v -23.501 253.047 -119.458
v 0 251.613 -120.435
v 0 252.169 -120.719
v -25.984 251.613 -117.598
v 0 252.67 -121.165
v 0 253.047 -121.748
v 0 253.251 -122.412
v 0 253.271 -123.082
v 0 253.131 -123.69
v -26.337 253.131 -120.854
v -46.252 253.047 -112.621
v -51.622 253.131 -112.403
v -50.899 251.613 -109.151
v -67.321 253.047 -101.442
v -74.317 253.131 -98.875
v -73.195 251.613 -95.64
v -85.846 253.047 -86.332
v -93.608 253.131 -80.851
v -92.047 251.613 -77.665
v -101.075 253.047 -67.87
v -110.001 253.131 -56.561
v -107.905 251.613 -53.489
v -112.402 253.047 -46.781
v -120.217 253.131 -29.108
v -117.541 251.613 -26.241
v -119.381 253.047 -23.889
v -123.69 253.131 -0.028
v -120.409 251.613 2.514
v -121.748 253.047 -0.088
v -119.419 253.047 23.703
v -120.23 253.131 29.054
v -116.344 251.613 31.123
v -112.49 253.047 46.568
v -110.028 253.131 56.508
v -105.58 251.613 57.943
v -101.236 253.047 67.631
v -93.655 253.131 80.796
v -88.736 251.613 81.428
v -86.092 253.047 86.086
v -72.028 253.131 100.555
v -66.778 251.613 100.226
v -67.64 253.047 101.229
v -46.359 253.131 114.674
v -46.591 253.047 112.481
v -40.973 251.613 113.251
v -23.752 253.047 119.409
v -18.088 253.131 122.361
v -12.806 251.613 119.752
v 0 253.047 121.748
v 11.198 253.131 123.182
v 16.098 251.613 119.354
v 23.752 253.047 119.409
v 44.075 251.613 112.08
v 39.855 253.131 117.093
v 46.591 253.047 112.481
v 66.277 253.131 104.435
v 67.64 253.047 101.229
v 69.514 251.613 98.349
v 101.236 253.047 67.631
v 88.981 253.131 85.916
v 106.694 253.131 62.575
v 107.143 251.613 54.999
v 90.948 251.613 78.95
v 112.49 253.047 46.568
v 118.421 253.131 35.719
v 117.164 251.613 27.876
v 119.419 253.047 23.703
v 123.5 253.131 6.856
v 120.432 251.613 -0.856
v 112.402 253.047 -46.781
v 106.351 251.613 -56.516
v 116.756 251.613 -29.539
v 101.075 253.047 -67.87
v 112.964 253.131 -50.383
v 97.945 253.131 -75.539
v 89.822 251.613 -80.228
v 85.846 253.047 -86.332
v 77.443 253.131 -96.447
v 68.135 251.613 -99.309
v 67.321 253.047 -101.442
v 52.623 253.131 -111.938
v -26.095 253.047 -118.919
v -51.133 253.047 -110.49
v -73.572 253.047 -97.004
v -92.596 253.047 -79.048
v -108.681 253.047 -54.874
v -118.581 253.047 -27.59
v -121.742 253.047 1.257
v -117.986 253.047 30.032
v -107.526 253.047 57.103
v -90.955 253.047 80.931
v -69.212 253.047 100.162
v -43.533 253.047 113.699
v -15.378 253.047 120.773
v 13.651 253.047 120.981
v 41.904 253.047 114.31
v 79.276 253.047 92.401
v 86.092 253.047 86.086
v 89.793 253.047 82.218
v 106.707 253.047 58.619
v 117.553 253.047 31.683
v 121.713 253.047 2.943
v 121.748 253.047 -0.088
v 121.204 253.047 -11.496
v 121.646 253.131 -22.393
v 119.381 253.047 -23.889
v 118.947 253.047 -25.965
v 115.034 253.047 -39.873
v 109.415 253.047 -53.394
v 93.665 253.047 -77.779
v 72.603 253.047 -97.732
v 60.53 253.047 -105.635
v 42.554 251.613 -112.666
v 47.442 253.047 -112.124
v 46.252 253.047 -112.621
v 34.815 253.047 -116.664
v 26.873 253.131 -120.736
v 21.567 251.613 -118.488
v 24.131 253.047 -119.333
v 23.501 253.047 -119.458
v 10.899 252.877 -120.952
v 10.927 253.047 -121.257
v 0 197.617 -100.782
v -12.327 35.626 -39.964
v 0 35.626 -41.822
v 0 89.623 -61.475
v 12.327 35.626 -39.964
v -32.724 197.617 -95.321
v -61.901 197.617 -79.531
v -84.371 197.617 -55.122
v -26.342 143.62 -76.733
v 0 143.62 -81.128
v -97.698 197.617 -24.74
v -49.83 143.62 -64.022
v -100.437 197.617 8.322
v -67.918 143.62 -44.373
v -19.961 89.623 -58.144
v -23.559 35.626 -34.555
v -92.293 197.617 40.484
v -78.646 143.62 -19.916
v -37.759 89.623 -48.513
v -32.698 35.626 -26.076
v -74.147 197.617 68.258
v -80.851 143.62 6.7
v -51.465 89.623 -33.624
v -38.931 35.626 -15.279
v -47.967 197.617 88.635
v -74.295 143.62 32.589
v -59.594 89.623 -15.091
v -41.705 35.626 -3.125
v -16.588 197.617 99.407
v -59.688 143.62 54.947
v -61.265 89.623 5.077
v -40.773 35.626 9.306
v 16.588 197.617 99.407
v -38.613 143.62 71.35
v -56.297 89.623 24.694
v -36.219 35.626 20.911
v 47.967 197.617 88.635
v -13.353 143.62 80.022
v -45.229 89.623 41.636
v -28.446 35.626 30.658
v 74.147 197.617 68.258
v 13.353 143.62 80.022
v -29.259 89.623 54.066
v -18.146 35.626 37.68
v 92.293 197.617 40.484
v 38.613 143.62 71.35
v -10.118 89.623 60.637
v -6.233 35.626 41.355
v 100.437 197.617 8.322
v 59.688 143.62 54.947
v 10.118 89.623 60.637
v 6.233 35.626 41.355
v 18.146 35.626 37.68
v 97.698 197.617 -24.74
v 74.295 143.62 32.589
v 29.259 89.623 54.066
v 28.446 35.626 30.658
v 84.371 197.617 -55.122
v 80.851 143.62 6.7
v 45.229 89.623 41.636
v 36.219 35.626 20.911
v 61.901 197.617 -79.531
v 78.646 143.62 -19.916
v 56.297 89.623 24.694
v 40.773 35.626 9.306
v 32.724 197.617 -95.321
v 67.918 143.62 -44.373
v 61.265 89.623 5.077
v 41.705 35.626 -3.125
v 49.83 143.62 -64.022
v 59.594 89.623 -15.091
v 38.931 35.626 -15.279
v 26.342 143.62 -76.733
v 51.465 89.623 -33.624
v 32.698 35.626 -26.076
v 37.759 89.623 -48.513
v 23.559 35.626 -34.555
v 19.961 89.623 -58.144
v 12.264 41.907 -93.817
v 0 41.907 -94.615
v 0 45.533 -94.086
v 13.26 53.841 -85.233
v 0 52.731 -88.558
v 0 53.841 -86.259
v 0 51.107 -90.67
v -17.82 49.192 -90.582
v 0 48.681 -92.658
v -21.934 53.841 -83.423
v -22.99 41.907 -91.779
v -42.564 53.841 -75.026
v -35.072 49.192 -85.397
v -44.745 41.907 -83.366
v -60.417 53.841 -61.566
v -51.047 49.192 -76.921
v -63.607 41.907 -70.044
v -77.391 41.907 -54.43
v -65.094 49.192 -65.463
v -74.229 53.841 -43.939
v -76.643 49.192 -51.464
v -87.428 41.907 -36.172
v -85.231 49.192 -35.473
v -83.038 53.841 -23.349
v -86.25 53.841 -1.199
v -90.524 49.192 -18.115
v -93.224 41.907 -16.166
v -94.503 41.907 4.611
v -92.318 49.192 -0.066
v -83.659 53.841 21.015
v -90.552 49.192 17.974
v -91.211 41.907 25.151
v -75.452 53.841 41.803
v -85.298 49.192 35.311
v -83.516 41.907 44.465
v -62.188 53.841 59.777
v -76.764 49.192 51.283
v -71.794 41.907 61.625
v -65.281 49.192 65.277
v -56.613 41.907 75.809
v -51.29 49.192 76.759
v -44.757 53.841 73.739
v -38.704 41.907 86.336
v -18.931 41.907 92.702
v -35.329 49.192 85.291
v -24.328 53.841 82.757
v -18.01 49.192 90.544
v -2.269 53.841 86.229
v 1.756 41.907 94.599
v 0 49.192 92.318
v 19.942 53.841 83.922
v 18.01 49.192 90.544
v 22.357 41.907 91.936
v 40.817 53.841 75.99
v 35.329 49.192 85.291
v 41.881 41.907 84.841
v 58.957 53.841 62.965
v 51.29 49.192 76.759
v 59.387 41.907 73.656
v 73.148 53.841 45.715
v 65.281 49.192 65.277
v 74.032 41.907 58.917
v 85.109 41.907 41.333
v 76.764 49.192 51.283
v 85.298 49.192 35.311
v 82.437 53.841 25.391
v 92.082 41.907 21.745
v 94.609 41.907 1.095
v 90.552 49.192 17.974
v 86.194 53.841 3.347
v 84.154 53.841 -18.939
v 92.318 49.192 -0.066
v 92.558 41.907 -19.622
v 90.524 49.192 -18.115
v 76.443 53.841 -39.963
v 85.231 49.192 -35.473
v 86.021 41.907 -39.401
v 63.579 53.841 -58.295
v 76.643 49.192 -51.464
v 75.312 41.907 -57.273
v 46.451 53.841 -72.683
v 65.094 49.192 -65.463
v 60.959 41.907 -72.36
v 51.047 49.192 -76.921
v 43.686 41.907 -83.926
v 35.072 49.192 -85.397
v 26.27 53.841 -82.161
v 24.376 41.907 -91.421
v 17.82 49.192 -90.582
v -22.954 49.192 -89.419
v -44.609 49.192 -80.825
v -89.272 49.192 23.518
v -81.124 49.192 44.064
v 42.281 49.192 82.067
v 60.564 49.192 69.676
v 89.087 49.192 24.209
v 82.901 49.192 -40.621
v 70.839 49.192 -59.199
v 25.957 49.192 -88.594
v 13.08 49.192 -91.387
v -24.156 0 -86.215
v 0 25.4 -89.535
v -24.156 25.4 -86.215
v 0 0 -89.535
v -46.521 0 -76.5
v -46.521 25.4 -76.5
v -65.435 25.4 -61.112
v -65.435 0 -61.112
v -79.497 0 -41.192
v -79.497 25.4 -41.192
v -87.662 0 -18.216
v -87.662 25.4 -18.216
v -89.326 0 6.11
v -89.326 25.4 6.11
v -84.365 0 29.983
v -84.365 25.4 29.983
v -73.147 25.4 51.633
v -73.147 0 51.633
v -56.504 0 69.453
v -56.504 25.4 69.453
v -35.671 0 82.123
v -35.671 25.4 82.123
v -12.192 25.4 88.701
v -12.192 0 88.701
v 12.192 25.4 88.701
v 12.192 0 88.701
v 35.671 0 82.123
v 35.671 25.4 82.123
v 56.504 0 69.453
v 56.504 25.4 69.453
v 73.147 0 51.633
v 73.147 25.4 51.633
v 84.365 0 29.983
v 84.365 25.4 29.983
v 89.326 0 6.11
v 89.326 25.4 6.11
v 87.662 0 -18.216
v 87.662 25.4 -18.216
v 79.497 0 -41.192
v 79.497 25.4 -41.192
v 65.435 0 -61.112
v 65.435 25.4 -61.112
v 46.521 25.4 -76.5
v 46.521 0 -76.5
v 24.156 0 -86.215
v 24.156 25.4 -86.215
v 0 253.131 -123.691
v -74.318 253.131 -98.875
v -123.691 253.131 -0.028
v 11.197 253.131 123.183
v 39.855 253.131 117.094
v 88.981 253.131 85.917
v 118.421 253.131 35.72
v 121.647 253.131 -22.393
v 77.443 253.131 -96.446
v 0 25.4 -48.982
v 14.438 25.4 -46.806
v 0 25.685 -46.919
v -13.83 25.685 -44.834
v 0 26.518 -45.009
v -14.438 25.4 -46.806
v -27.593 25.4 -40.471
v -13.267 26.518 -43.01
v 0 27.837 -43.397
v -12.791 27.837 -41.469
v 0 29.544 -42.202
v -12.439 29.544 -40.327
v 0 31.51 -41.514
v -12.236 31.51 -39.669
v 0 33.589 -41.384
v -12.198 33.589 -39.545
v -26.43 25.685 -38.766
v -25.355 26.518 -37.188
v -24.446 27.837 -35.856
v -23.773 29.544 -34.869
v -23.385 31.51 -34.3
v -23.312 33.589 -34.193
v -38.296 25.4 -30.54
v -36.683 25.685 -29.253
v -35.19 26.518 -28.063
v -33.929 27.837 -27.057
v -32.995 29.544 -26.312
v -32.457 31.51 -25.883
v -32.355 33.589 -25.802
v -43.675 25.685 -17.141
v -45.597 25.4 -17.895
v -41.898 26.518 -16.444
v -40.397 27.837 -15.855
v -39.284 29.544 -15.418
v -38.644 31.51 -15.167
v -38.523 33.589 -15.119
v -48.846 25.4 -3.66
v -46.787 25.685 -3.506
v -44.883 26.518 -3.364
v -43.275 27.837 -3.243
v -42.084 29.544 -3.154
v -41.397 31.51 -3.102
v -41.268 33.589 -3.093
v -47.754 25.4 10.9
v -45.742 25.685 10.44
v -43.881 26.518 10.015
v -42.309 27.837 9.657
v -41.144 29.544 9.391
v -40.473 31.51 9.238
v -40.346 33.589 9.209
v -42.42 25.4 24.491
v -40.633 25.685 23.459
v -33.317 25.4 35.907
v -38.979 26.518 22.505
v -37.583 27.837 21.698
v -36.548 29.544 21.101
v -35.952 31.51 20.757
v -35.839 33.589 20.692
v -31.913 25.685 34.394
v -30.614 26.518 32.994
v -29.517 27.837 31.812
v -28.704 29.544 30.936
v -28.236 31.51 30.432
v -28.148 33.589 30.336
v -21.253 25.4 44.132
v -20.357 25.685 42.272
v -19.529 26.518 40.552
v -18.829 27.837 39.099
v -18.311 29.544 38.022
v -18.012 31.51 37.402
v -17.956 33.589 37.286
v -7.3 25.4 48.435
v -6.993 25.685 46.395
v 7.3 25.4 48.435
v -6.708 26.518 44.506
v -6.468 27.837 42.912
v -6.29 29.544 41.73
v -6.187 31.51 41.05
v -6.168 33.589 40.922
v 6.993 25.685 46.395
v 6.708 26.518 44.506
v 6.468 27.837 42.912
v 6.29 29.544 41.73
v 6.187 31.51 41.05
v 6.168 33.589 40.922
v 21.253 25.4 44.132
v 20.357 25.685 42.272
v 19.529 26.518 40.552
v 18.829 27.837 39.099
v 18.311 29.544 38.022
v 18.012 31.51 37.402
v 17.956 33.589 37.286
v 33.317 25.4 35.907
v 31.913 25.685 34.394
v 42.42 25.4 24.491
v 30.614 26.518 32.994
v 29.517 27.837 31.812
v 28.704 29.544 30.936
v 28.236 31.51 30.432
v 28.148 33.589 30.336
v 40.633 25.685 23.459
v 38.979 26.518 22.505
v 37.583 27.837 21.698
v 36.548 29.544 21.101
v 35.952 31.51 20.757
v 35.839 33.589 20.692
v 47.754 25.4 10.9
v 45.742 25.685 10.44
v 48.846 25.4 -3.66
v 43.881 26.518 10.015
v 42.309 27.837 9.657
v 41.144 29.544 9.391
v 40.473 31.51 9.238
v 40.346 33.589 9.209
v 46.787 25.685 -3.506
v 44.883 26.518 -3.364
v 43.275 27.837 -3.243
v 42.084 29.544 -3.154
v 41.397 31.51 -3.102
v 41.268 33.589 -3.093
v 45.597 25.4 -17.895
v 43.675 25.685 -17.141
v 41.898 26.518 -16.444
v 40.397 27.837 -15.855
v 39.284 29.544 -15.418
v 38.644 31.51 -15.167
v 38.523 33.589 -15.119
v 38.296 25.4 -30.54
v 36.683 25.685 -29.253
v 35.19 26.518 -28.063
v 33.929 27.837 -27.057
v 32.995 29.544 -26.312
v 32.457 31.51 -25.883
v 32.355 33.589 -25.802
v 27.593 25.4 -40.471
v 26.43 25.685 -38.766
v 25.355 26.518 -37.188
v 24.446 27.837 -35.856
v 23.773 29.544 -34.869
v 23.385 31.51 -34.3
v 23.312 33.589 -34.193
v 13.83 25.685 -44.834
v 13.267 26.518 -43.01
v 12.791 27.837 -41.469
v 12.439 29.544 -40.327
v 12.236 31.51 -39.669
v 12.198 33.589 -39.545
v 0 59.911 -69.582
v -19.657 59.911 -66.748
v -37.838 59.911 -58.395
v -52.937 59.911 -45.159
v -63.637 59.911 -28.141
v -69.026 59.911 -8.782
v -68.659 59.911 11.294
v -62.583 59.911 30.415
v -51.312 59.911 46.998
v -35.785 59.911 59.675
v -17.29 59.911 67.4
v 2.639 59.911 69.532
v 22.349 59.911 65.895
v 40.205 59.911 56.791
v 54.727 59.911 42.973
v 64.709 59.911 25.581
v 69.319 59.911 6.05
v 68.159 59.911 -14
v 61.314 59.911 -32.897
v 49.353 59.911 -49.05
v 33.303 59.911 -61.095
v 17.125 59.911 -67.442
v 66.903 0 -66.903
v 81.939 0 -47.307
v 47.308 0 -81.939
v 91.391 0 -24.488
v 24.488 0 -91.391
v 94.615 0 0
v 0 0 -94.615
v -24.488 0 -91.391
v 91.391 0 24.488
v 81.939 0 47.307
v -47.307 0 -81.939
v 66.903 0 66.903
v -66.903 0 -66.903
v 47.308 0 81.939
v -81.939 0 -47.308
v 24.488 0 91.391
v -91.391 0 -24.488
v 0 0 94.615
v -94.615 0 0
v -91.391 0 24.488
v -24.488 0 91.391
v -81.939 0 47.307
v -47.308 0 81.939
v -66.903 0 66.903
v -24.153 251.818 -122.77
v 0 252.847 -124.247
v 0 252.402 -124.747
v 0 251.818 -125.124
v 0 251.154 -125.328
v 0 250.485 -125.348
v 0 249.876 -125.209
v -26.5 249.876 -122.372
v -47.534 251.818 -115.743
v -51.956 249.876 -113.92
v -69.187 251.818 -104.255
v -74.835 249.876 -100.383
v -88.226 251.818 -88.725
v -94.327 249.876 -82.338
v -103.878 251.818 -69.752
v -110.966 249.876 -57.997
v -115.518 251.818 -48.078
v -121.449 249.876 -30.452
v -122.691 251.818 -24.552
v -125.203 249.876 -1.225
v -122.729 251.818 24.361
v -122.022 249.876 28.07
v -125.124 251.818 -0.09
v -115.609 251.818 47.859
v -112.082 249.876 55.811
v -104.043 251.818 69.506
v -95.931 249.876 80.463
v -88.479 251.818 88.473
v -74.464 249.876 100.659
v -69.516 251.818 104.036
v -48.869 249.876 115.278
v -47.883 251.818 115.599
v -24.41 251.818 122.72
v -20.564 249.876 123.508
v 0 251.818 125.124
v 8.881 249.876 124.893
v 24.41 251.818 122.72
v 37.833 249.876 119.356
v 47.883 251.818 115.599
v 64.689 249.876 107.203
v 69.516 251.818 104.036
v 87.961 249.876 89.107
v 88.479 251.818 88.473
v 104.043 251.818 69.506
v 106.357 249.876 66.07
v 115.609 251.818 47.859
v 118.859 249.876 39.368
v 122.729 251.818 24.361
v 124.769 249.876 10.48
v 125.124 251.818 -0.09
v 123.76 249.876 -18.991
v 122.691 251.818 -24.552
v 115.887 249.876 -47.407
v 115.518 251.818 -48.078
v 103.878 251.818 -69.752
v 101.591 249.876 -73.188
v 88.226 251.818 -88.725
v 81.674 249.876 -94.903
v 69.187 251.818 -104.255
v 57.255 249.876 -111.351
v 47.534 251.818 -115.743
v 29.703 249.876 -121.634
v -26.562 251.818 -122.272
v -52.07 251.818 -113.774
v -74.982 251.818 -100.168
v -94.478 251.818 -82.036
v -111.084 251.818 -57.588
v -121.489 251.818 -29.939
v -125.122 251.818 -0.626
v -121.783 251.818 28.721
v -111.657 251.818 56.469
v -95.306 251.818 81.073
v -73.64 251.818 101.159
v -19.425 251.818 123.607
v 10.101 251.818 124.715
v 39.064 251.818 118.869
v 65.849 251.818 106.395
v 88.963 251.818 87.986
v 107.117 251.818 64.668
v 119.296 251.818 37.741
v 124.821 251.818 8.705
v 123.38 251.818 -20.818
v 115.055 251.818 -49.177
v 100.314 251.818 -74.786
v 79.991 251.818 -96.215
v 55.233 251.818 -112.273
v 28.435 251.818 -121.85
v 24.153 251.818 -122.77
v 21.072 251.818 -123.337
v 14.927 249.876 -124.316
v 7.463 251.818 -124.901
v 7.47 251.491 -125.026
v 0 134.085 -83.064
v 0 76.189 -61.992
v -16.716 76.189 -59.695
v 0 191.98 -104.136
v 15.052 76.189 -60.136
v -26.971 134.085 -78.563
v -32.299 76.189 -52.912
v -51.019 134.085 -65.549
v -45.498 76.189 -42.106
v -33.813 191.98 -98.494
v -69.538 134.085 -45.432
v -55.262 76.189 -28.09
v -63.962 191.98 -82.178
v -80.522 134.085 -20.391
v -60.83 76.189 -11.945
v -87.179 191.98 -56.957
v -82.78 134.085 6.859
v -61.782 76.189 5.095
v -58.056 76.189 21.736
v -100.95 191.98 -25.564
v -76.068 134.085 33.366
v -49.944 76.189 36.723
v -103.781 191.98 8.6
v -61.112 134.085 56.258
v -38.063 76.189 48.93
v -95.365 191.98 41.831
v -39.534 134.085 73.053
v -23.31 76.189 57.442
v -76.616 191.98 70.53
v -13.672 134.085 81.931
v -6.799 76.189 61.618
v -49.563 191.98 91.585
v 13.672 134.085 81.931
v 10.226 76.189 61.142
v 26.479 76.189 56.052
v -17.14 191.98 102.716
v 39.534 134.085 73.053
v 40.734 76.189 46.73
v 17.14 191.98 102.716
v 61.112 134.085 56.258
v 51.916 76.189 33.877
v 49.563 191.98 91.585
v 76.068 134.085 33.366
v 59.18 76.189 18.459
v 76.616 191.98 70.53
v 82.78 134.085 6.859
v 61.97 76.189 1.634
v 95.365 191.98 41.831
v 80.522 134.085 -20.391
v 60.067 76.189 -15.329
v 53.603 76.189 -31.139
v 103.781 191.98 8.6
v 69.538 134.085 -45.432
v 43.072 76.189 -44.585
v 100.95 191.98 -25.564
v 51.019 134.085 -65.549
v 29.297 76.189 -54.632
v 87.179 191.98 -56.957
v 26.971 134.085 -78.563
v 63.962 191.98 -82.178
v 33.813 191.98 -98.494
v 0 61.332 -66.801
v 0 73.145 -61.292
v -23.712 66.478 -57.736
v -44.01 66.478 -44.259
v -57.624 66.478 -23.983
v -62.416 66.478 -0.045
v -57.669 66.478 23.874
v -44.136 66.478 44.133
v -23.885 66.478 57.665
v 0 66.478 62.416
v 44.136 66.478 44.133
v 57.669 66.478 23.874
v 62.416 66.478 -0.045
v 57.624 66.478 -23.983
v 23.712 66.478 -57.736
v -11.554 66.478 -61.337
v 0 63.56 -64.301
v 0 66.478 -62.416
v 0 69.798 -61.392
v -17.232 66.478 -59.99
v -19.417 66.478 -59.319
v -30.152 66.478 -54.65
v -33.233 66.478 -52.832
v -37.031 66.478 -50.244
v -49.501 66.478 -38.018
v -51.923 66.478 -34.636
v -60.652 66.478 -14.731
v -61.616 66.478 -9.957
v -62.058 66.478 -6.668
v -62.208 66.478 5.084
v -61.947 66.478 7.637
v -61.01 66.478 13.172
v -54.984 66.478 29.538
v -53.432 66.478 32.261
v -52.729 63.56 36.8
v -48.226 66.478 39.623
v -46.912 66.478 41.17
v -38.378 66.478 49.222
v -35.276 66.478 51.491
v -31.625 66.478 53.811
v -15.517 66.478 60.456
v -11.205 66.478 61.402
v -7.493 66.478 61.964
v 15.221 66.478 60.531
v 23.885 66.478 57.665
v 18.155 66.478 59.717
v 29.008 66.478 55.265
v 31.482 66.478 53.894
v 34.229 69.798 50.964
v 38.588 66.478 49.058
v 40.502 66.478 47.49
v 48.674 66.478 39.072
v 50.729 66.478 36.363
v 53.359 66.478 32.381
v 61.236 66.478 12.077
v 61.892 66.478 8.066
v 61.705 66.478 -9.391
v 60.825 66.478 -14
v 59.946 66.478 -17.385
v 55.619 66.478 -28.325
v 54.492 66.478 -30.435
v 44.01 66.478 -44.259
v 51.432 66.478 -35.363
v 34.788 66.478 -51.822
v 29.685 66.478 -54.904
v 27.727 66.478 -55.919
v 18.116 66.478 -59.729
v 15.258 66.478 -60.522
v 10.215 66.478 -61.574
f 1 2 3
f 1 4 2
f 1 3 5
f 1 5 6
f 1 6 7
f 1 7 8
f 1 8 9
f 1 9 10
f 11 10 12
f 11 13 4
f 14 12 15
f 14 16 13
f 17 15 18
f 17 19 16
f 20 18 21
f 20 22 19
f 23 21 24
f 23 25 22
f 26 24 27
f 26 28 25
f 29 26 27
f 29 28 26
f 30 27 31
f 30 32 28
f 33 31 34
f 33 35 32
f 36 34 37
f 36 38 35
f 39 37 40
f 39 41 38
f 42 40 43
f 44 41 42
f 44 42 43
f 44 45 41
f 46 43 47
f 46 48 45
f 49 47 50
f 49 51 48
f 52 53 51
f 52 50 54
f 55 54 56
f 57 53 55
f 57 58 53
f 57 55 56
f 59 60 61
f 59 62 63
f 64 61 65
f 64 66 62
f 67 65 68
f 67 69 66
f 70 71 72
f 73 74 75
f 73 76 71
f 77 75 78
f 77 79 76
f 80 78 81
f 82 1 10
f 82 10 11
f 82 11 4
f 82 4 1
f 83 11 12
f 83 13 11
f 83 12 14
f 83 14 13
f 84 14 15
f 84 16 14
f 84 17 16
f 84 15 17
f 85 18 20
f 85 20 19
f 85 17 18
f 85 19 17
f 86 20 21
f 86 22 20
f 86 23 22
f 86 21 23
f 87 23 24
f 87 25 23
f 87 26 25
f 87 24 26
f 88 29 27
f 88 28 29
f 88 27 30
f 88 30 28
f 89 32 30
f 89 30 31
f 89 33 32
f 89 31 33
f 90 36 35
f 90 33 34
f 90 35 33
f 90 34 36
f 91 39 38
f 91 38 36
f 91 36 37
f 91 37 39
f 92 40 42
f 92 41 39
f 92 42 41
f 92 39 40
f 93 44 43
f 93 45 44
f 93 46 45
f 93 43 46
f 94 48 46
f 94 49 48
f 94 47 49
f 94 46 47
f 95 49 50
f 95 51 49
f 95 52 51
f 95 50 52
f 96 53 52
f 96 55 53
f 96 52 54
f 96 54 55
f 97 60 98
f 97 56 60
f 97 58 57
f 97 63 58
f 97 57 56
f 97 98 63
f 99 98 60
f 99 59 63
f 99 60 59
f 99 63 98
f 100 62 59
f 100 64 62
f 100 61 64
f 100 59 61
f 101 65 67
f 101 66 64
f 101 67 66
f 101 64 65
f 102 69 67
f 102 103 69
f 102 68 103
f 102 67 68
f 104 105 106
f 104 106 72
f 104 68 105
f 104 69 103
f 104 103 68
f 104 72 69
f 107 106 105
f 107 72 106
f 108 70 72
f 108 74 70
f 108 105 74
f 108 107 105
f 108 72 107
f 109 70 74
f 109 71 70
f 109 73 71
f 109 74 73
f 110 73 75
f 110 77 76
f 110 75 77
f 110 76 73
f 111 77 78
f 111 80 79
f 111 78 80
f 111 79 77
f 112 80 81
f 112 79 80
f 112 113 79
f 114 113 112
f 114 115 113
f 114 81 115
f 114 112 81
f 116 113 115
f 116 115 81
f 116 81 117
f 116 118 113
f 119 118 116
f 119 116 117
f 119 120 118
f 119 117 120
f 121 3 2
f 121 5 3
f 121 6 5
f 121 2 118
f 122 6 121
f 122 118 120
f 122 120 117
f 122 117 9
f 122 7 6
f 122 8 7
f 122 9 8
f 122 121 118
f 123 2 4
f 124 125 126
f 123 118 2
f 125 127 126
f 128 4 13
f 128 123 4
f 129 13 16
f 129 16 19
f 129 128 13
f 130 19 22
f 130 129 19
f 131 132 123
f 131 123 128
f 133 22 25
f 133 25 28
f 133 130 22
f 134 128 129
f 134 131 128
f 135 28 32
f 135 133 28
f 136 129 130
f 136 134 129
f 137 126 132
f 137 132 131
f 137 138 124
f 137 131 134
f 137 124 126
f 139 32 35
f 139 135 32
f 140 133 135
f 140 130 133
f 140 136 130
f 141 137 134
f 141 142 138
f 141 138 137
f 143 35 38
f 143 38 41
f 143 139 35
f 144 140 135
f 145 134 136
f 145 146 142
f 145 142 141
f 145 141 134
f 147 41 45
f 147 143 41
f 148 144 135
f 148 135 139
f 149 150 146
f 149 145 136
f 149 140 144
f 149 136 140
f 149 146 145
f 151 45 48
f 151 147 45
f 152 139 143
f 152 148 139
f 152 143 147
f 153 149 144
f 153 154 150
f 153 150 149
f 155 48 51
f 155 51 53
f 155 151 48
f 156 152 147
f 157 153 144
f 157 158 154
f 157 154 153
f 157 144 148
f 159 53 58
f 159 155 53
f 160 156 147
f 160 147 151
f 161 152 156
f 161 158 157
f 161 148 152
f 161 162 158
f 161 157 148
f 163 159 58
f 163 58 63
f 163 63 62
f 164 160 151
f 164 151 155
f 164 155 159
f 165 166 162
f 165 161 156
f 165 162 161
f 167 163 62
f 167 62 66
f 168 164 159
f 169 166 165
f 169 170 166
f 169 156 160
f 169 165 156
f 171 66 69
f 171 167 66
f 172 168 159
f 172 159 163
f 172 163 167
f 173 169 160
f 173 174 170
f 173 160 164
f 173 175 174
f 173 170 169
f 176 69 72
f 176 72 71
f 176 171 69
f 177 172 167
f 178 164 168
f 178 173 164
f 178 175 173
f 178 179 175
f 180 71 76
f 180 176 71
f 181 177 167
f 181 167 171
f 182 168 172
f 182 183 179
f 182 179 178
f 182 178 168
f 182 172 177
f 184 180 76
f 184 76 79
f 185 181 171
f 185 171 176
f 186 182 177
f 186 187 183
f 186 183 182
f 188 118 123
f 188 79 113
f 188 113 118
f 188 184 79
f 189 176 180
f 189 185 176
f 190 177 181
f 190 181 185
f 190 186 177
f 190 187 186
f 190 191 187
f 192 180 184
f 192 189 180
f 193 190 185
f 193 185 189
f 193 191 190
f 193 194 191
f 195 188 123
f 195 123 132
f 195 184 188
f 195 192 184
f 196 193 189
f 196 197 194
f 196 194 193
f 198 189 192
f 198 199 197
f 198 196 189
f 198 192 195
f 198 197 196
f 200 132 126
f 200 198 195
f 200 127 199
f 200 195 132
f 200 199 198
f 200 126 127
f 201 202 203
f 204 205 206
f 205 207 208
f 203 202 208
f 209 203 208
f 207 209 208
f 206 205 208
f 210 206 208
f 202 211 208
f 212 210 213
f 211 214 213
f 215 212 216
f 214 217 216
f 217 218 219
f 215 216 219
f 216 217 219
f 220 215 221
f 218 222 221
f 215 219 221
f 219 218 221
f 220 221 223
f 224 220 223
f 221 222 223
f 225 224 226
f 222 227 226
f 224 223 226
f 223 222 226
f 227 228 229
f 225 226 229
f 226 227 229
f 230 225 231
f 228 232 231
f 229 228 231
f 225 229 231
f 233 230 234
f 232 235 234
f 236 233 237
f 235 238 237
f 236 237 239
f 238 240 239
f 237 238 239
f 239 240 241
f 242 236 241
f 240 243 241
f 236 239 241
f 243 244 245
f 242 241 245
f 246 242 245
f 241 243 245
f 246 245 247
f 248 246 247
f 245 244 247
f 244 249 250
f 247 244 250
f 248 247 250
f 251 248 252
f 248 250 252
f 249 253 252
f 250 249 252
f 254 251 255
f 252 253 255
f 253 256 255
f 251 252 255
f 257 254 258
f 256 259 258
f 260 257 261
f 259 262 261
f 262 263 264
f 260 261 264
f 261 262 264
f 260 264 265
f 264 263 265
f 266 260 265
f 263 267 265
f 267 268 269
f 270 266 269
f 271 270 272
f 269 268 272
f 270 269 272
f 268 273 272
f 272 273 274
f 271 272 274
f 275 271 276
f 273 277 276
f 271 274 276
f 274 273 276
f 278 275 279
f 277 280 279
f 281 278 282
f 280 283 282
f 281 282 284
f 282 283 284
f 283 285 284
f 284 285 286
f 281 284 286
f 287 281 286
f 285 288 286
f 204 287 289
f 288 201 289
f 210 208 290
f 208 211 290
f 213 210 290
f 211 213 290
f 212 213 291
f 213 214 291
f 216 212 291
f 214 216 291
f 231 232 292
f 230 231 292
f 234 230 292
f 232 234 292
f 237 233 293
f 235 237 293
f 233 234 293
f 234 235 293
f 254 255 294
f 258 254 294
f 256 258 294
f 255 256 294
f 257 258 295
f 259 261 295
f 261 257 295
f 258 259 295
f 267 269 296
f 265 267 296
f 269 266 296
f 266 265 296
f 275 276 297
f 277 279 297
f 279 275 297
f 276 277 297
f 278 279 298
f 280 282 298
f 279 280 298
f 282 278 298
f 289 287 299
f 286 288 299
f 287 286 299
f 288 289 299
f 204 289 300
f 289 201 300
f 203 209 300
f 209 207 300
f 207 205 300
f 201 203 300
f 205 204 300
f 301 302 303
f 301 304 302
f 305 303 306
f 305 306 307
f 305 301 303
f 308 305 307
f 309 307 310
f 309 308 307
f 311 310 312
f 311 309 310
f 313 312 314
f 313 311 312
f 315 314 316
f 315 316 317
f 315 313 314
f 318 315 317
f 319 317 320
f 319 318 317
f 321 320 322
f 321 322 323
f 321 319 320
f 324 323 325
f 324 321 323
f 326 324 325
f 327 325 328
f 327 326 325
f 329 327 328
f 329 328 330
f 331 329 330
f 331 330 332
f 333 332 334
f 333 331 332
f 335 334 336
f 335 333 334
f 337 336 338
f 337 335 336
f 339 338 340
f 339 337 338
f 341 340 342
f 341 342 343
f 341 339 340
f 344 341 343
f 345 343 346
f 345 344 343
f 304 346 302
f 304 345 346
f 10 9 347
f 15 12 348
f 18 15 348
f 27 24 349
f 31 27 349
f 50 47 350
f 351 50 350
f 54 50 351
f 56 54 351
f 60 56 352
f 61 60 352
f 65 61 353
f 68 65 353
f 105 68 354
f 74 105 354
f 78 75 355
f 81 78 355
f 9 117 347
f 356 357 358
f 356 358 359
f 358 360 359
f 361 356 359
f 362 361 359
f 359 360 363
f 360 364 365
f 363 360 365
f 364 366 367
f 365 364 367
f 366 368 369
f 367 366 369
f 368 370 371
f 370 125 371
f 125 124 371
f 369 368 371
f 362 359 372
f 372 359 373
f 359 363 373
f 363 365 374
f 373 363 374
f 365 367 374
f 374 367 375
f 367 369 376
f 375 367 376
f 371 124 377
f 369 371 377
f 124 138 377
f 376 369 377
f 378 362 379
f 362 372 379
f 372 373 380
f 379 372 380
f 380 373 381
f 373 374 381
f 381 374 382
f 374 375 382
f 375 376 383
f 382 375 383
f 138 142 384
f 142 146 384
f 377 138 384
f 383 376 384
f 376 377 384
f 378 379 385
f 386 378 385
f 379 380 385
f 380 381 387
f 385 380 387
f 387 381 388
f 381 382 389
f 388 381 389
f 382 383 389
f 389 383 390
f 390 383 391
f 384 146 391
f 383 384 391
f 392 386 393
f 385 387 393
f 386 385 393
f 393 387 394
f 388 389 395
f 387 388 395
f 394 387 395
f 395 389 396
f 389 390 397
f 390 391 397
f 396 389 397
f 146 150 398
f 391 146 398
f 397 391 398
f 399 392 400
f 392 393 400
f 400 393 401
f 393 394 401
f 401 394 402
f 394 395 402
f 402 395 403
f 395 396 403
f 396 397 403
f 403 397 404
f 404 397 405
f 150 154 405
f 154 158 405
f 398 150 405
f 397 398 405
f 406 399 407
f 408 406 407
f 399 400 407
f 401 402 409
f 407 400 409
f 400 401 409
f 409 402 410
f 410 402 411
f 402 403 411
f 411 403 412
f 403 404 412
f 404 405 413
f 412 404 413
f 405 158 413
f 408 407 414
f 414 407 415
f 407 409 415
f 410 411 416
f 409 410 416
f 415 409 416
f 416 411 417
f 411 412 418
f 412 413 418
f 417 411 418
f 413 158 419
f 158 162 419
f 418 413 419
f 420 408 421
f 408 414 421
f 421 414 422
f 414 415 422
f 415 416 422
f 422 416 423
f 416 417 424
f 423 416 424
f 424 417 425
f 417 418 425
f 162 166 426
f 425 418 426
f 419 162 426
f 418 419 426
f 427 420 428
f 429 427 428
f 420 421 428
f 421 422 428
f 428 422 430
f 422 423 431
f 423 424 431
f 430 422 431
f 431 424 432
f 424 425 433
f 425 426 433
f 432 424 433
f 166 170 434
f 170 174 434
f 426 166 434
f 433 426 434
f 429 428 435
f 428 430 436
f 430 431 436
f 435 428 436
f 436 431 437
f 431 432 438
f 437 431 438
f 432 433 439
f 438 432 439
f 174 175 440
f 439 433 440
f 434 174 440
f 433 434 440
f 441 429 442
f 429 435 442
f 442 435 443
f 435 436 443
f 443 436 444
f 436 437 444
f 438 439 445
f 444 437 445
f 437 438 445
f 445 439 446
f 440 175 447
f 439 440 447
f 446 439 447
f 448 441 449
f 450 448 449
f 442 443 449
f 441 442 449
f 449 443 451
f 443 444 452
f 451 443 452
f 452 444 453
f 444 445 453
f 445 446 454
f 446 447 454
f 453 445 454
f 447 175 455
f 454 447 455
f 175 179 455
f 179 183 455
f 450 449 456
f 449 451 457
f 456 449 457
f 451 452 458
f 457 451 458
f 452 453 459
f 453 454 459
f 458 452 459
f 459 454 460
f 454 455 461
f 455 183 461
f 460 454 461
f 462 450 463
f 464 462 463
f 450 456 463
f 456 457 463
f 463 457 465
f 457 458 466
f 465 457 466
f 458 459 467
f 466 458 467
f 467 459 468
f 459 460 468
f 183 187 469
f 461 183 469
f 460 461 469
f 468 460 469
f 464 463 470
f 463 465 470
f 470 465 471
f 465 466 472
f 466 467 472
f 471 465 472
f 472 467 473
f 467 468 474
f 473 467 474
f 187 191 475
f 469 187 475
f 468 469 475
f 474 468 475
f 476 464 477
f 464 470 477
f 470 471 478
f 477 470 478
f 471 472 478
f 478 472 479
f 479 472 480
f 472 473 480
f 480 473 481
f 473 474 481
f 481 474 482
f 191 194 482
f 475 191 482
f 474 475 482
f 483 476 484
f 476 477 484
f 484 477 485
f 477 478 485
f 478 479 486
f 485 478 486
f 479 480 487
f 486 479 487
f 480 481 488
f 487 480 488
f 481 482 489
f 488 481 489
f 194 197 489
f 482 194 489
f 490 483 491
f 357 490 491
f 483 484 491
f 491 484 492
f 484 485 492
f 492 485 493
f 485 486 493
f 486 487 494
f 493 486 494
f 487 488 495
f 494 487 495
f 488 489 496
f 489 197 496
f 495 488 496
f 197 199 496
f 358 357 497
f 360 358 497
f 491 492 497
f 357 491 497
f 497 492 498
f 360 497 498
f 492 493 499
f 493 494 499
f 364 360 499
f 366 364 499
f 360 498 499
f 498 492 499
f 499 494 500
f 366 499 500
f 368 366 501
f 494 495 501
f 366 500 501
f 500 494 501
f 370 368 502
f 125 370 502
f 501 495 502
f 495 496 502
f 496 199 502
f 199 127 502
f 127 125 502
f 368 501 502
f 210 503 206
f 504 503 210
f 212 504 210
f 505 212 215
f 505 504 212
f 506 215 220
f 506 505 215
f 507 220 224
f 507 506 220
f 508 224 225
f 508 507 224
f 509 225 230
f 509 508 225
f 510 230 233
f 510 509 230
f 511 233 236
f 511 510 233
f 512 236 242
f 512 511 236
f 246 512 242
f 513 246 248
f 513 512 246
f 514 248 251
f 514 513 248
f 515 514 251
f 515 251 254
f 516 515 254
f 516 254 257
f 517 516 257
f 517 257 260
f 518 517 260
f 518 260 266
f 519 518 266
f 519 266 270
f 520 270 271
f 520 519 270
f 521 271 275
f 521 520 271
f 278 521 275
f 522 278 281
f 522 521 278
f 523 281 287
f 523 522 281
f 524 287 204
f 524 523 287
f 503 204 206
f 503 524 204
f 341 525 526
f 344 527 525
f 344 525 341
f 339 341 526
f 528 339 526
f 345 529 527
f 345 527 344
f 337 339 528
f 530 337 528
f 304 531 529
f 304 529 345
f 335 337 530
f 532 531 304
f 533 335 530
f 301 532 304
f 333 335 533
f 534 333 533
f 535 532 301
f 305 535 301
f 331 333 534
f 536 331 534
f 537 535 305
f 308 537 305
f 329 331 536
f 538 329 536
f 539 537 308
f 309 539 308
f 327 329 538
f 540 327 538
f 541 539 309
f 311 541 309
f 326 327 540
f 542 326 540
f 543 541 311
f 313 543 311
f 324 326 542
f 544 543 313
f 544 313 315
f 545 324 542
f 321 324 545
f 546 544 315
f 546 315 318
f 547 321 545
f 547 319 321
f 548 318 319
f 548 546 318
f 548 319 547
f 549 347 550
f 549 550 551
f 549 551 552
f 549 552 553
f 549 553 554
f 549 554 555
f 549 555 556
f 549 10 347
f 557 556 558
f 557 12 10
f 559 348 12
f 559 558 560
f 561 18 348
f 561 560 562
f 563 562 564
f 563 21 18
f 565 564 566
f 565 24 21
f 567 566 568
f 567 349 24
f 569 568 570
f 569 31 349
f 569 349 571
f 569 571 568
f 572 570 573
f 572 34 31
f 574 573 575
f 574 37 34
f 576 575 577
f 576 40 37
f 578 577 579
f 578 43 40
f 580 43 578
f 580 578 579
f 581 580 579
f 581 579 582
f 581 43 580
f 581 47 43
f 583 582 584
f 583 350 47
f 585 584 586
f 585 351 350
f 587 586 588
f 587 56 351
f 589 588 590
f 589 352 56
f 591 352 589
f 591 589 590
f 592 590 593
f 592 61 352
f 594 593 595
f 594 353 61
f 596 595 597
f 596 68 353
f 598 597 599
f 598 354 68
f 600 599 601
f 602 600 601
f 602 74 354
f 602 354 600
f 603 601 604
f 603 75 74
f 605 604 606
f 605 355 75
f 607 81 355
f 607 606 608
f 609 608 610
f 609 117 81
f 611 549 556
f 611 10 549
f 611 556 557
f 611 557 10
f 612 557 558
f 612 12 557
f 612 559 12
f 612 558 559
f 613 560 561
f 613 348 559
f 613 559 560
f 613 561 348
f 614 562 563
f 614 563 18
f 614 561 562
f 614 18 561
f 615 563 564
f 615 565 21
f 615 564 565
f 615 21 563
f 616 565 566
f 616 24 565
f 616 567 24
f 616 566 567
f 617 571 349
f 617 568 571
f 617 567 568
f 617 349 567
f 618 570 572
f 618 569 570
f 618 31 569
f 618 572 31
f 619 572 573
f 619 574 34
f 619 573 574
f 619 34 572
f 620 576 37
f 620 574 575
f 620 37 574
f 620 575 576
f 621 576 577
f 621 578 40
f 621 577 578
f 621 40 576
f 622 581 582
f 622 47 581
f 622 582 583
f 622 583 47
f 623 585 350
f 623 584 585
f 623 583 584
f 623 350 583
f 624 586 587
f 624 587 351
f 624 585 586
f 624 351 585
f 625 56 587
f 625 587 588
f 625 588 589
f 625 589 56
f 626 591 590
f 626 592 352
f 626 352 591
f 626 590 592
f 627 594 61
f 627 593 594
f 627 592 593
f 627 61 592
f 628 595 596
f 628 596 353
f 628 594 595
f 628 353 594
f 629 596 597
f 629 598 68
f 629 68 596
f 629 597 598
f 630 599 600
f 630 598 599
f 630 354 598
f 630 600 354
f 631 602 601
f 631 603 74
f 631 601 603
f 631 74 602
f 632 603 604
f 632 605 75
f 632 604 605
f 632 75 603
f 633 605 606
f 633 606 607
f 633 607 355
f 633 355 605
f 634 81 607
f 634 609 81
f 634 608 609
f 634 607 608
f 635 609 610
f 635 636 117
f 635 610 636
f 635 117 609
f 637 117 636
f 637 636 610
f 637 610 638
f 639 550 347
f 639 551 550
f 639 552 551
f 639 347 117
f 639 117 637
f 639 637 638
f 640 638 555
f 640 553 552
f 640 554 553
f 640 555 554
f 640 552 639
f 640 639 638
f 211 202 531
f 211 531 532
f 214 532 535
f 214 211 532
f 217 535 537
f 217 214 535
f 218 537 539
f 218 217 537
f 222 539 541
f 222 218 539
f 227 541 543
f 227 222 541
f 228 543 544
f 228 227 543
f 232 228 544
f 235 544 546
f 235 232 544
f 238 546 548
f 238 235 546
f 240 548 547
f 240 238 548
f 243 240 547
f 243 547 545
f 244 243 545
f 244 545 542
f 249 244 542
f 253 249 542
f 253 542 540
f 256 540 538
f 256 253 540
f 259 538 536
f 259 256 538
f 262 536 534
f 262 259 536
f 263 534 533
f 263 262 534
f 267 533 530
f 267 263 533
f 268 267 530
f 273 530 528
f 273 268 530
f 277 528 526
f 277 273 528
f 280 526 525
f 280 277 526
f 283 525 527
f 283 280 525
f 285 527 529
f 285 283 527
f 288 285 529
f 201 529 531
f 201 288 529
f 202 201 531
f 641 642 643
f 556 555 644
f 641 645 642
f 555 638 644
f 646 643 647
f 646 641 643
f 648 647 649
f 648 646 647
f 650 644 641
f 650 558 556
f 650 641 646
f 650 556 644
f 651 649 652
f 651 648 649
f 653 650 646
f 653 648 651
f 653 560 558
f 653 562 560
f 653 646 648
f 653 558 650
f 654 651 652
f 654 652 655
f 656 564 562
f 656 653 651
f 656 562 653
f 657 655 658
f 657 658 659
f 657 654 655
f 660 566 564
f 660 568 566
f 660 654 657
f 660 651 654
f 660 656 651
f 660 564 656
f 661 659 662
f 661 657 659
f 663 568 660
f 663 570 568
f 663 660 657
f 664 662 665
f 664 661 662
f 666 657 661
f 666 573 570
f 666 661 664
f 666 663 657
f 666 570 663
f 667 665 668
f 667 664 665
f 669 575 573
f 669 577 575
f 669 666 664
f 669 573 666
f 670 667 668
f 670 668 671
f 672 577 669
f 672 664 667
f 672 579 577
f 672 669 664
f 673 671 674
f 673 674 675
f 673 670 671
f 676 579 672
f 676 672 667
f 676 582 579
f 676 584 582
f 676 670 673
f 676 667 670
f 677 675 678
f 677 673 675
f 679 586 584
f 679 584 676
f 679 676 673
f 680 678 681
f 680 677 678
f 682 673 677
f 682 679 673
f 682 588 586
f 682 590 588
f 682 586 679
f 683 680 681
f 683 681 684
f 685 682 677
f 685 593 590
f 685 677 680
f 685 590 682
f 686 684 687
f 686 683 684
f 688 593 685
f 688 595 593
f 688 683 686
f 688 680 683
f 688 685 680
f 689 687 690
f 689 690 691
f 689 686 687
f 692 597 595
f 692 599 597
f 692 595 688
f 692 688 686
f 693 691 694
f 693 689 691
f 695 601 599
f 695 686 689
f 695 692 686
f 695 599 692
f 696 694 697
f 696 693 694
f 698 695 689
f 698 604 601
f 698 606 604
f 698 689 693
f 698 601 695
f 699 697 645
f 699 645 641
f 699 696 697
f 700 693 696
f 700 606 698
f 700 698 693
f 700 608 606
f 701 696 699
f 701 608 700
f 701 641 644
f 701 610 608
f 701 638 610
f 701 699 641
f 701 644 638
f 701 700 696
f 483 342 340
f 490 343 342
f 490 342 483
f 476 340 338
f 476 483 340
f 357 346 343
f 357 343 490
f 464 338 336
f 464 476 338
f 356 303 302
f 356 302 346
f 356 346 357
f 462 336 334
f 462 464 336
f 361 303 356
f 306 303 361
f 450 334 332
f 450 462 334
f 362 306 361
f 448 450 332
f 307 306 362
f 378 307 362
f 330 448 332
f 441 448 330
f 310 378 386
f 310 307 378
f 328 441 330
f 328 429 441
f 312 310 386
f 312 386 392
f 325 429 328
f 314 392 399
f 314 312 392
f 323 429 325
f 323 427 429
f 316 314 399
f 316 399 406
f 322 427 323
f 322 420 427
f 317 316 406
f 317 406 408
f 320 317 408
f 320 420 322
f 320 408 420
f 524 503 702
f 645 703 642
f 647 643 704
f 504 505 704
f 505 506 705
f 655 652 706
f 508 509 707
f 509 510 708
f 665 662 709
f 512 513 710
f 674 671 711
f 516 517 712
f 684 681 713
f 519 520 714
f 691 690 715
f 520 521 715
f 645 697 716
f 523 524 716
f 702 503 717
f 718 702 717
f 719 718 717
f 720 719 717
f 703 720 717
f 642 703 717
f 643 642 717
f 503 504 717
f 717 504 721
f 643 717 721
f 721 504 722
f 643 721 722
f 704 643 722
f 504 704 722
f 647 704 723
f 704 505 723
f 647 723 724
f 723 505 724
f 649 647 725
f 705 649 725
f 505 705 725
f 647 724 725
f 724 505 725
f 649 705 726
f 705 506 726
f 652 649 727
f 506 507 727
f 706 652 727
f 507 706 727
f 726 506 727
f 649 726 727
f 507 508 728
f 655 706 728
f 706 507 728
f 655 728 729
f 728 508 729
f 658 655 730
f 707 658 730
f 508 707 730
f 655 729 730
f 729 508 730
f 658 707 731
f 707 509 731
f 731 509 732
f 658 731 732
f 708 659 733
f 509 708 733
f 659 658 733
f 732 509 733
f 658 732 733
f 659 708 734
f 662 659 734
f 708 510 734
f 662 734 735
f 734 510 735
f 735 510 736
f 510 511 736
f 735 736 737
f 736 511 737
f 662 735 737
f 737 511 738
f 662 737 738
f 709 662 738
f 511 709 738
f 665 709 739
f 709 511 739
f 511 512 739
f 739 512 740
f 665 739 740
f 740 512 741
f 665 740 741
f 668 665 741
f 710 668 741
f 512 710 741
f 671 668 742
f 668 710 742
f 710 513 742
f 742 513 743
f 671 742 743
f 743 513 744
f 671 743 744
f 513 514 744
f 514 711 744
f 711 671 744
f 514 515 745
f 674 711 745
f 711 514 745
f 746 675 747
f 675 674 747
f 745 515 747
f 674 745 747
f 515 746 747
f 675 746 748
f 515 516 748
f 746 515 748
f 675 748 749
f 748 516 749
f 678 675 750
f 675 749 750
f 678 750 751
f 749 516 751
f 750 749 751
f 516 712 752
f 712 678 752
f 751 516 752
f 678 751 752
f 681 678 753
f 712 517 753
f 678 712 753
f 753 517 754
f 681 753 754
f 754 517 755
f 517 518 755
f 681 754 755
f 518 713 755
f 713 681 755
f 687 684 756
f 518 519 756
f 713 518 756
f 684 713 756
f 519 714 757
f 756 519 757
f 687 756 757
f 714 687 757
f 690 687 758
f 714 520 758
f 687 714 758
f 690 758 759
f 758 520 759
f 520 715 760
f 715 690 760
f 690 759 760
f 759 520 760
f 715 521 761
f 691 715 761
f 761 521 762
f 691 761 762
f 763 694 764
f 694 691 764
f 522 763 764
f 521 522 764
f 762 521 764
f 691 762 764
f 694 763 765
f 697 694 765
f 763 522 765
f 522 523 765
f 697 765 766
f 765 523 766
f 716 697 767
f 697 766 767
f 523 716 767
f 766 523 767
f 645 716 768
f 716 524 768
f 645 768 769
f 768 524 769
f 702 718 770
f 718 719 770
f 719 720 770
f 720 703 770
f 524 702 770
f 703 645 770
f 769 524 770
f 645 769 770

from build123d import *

# Parameters (mm, degrees)
FILLET1_R = 12.7
FILLET2_R = 7.62
FILLET3_R = 2.54


with BuildPart() as part:
    # Sketch1 → Revolve1 (revolve)
    with BuildSketch(Plane.XY, mode=Mode.PRIVATE) as revolve1_sk:
        Polygon((-94.615, 0), (-94.615, 50.8), (-57.648040305, 64.25487298), (-126.077234067, 252.262537672), (-121.303595553, 254), (-38.1, 25.4), (-89.535, 25.4), (-89.535, 0), align=None)
    revolve(revolve1_sk.sketch.rotate(Axis((0, 0, 0), (0, 1, 0)), 270), axis=Axis((0, 0, 0), (0, 1, 0)))

    # Fillet1
    fillet1_edges = [part.edges().sort_by_distance(p)[0] for p in [
        (0, 50.8, 94.615),
        (0, 64.25487298, 57.648040305),
    ]]
    fillet(fillet1_edges, radius=FILLET1_R)

    # Fillet2
    fillet2_edges = [part.edges().sort_by_distance(p)[0] for p in [
        (0, 25.4, 38.1),
    ]]
    fillet(fillet2_edges, radius=FILLET2_R)

    # Fillet3
    fillet3_edges = [part.edges().sort_by_distance(p)[0] for p in [
        (0, 252.262537672, 126.077234067),
        (0, 254, 121.303595553),
    ]]
    fillet(fillet3_edges, radius=FILLET3_R - 0.0001)  # a hair under: the kernel refuses the full size


solid = part.part
